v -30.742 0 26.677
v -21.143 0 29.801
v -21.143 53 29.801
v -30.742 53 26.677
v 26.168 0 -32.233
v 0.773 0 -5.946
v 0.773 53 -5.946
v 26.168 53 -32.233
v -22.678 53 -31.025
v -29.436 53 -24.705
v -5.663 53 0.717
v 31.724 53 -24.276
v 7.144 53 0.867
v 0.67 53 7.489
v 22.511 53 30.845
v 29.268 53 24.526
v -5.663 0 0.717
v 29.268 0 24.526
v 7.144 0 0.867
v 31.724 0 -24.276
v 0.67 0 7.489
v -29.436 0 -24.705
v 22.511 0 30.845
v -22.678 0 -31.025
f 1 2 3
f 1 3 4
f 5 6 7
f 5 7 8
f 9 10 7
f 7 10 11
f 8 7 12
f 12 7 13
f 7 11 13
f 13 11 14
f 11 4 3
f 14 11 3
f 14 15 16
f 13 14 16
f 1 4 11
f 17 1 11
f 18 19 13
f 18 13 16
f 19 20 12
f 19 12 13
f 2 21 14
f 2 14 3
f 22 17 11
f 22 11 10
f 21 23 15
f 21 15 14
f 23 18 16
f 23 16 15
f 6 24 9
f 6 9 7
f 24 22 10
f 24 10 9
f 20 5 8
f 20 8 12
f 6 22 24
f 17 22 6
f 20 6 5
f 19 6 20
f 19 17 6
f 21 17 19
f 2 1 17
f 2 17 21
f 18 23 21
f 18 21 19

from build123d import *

# Parameters (mm, degrees)
F1_DEPTH = 53


# Not quite as in the source:
# - a feature names something its author has since deleted; it is built from what else it names


with BuildPart() as f1:
    # F0 (on Front) → F1 (new body)
    with BuildSketch(Plane.XZ):
        Polygon((-30.7423530247, 26.6767482577), (-5.6632759116, 0.7168226163), (0.6696432283, 7.4890868759), (-21.1426665217, 29.8010575561), align=None)
        Polygon((7.143901395, 0.8665209922), (29.2684723572, 24.5259800626), (22.5106922376, 30.8453547093), (0.6696432283, 7.4890868759), align=None)
        Polygon((0.7734024336, -5.9459301822), (26.1681957986, -32.2326609282), (31.7237185496, -24.2763531905), (7.143901395, 0.8665209922), align=None)
        Polygon((-5.6632759116, 0.7168226163), (0.7734024336, -5.9459301822), (7.143901395, 0.8665209922), (0.6696432283, 7.4890868759), align=None)
        Polygon((-29.4360663926, -24.7052009039), (-22.678286273, -31.0245755505), (0.7734024336, -5.9459301822), (-5.6632759116, 0.7168226163), align=None)
    extrude(amount=-F1_DEPTH)


solid = f1.part
